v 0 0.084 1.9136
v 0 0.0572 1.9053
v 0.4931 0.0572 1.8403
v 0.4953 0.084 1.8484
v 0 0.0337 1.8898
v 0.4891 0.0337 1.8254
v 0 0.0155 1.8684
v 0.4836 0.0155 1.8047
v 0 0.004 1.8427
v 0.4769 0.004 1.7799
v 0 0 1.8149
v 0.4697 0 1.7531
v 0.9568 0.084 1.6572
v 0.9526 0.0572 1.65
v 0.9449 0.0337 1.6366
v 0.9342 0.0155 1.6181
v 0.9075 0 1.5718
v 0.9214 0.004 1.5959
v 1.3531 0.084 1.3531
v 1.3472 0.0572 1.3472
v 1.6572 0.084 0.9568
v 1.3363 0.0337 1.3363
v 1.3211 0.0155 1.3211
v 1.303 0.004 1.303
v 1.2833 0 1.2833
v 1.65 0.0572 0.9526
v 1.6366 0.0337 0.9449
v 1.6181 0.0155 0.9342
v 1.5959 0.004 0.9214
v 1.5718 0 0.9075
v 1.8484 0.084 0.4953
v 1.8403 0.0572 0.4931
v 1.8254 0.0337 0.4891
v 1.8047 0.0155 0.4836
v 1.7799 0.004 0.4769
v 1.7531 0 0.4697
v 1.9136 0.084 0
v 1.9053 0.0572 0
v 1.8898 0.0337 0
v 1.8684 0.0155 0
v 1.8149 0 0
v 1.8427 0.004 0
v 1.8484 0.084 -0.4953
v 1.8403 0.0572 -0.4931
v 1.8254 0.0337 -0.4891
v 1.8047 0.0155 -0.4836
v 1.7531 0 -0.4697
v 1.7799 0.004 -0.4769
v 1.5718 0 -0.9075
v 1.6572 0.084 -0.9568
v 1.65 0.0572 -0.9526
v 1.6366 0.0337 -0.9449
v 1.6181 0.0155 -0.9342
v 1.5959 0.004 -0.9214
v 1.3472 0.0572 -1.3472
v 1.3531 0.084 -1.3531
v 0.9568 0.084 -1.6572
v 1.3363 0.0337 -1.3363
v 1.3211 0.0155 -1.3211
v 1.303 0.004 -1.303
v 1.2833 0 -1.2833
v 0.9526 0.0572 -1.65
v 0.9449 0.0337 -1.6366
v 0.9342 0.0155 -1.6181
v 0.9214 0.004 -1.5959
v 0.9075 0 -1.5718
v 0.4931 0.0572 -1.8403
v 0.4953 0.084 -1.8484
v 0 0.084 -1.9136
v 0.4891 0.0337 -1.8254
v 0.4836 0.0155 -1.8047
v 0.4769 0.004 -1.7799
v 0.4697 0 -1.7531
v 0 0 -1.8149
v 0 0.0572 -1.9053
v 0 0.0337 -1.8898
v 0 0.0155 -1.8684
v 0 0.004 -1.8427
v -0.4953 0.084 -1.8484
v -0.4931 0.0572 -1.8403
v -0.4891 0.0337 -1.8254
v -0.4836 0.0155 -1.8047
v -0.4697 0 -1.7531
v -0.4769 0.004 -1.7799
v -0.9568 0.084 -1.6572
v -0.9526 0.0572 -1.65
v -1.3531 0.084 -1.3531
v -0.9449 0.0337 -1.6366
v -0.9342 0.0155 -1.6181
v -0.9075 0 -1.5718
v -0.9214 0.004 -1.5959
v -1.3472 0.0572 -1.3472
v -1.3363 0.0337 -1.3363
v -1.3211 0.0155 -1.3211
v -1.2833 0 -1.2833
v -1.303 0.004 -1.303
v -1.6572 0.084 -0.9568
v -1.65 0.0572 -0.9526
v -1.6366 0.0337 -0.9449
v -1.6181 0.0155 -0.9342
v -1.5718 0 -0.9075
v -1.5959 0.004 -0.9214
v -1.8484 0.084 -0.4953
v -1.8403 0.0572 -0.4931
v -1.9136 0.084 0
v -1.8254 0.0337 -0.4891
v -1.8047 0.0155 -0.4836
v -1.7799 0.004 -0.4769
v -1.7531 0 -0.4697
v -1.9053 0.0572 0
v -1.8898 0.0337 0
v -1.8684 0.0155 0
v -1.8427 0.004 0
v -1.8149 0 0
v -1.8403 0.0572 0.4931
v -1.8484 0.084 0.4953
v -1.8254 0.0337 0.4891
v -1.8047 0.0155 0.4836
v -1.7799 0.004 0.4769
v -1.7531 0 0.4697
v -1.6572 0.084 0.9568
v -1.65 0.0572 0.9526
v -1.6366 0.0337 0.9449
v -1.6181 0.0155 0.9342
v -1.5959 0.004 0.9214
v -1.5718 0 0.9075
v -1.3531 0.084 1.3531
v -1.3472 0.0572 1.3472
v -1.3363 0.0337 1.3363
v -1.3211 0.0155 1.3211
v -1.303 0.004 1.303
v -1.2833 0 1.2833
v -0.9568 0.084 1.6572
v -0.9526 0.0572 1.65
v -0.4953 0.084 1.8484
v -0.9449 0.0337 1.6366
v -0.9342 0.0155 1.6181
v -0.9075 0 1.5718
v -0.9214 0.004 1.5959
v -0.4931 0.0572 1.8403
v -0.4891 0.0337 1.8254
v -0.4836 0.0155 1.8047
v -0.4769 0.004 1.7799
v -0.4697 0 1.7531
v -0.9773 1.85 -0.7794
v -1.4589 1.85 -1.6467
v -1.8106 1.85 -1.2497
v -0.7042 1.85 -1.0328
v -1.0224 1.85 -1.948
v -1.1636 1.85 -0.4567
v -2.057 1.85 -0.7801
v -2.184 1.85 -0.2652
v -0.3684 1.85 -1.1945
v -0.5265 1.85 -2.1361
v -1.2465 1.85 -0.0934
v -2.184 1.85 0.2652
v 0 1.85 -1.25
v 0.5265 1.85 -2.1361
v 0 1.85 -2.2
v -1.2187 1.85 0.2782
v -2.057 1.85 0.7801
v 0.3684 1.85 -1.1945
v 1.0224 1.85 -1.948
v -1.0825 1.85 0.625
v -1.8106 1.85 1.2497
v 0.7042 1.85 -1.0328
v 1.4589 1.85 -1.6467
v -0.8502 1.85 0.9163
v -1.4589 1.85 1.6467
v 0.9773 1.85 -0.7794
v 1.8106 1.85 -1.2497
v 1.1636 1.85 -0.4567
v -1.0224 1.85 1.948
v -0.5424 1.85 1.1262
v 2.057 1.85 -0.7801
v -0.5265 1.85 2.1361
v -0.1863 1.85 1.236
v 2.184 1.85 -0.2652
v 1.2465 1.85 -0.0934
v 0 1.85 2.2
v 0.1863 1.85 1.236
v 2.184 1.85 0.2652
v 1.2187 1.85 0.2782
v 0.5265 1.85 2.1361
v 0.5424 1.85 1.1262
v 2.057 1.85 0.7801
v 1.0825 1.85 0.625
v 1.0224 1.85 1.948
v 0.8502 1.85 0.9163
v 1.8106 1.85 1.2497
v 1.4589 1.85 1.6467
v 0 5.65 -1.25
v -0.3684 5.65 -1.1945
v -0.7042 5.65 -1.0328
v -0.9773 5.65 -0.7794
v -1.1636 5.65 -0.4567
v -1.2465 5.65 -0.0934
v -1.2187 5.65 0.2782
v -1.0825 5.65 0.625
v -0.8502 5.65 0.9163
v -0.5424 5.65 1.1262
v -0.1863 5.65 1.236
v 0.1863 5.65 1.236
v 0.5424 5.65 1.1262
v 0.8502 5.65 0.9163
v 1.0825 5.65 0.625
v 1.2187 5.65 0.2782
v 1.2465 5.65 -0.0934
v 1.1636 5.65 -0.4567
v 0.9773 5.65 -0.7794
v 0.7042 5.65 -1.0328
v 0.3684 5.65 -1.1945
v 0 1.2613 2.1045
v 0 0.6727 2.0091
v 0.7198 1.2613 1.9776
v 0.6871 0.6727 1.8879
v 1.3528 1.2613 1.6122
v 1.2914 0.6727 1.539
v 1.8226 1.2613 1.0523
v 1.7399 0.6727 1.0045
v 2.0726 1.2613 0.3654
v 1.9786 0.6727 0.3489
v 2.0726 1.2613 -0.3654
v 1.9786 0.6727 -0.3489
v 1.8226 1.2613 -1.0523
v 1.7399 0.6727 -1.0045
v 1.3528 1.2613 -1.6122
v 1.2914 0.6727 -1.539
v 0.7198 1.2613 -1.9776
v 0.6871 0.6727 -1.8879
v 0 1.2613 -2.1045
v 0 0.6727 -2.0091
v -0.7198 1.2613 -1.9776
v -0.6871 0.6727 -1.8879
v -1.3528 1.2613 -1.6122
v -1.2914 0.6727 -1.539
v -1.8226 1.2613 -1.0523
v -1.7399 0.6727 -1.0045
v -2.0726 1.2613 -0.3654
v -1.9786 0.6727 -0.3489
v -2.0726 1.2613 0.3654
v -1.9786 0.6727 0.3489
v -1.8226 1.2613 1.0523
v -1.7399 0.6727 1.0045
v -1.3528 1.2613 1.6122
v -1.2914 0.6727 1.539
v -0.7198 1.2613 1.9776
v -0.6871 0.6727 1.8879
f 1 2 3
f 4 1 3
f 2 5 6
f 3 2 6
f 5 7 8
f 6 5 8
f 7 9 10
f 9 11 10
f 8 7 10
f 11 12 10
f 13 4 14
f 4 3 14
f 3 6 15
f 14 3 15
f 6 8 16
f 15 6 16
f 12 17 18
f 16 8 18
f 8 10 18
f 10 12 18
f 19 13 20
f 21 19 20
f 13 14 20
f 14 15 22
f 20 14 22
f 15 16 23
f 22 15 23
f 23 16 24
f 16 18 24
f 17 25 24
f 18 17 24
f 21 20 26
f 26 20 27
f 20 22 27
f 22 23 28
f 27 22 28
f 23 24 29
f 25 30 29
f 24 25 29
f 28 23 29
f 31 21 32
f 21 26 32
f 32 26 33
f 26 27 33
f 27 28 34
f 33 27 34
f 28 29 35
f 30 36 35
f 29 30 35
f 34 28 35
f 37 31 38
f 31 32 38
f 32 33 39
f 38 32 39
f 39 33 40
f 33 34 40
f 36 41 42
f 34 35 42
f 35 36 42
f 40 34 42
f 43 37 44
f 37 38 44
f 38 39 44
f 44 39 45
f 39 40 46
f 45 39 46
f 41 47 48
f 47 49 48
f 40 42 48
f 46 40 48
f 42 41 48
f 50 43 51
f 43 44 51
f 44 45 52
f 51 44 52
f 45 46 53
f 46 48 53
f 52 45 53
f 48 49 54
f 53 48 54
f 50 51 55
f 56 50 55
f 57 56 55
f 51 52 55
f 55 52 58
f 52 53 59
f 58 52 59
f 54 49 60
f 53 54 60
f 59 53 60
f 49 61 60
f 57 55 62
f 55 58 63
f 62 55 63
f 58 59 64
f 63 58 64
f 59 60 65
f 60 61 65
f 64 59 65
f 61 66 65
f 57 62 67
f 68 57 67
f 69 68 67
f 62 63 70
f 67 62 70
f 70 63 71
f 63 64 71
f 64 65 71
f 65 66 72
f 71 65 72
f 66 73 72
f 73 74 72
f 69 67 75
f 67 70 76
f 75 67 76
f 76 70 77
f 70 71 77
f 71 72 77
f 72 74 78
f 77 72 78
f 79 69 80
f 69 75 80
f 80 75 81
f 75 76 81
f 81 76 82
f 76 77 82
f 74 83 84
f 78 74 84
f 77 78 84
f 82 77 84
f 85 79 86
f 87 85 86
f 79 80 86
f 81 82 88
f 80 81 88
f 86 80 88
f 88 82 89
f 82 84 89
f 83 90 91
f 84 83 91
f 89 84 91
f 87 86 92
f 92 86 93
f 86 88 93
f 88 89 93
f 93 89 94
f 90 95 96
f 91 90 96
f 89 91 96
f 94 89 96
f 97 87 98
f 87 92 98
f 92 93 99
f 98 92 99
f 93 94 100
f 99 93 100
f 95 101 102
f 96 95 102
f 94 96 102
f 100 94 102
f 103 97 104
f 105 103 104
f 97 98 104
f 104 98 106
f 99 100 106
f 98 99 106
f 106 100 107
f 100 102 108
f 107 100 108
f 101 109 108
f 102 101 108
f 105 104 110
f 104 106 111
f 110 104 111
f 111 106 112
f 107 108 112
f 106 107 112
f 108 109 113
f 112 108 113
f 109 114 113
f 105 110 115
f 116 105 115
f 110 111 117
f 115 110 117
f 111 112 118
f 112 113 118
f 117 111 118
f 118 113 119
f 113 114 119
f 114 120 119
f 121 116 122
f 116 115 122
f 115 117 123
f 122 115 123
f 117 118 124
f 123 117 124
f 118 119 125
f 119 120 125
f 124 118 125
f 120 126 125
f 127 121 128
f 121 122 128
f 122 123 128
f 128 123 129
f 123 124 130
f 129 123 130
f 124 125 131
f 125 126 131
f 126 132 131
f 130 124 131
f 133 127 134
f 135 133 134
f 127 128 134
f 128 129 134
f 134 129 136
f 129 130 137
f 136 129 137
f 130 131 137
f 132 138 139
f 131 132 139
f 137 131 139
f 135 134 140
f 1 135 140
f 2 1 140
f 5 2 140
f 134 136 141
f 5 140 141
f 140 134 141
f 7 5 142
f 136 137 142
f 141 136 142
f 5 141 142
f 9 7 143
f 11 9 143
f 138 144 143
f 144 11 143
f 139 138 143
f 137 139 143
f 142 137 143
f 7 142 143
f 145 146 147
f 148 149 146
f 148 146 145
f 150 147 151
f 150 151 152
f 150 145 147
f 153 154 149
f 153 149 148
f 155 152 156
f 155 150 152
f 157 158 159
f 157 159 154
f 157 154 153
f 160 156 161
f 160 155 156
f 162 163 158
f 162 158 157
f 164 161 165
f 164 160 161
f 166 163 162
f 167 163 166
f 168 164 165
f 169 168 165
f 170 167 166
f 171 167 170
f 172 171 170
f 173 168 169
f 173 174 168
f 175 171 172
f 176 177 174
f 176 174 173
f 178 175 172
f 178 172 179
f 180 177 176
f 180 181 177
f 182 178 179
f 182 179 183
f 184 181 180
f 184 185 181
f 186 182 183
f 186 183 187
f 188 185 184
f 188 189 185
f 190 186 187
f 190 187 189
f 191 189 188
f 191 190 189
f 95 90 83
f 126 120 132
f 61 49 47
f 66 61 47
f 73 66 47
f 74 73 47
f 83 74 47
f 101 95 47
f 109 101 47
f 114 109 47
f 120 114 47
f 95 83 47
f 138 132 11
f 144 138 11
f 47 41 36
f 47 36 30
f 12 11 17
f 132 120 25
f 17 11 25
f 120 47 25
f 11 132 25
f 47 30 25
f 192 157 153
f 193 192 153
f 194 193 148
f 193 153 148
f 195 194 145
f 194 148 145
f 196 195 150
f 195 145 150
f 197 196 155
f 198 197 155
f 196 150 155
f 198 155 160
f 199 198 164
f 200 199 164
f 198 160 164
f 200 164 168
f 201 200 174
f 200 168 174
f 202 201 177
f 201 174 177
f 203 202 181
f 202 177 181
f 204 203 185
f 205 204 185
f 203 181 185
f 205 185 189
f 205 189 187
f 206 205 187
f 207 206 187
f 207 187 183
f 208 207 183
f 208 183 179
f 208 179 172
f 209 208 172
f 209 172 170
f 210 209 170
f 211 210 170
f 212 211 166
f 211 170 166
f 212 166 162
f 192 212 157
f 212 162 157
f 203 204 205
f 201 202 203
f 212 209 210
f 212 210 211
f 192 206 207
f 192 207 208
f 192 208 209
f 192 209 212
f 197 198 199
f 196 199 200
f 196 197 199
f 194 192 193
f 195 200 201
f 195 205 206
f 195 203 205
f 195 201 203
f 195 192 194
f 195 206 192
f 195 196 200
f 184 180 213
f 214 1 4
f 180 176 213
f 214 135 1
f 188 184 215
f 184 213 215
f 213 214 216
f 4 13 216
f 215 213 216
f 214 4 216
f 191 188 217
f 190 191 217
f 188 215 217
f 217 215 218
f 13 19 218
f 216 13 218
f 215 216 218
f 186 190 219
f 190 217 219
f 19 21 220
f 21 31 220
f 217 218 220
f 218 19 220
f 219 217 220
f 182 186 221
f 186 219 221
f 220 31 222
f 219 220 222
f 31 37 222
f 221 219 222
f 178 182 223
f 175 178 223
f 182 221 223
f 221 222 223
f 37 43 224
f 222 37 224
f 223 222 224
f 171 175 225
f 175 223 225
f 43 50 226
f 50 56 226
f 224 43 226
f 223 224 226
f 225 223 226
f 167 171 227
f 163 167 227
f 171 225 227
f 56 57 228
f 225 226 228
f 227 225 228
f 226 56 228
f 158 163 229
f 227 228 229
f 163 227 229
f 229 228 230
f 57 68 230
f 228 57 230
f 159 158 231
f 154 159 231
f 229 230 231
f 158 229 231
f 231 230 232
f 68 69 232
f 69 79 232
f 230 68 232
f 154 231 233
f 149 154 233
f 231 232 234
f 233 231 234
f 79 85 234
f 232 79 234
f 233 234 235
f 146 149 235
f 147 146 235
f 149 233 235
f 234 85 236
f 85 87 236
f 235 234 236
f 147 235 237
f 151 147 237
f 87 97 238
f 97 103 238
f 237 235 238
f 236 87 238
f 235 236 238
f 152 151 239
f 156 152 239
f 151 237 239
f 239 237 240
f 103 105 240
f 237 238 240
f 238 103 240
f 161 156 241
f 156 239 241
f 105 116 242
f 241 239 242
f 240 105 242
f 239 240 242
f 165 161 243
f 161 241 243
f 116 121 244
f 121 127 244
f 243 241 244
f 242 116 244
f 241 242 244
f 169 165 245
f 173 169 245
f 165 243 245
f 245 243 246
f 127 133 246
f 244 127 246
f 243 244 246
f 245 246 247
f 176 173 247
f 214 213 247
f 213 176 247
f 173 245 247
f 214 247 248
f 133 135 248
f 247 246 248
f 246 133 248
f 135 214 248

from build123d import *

# Parameters (mm, degrees)
ESQUISSE1_R        = 2.2
BOSS_EXTRU_1_DEPTH = 1.85
ESQUISSE2_R        = 1.25
BOSS_EXTRU_2_DEPTH = 3.8
CHANFREIN1_SIZE    = 1.85
CHANFREIN1_SIZE_2  = 0.3
CONG_1_R           = 0.1


with BuildPart() as part:
    # Esquisse1 → Boss.-Extru.1 (new body)
    with BuildSketch(Plane(origin=(0, 0, 0), x_dir=(1, 0, 0), z_dir=(0, 1, 0))):
        with Locations(Location((0, 0, 0), (0, 0, 270))):
            Circle(ESQUISSE1_R)
    extrude(amount=BOSS_EXTRU_1_DEPTH)

    # Esquisse2 → Boss.-Extru.2 (add)
    with BuildSketch(Plane(origin=(0, 1.85, 0), x_dir=(1, 0, 0), z_dir=(0, 1, 0))):
        with Locations(Location((0, 0, 0), (0, 0, 90))):
            Circle(ESQUISSE2_R)
    extrude(amount=BOSS_EXTRU_2_DEPTH)

    # Chanfrein1
    # the kernel refuses this chamfer: 1.85, 0.3 mm, written as the material it takes off along each edge
    with BuildSketch(Plane(origin=(0, 0, 0), x_dir=(0, 0, 1), z_dir=(-1, 0, 0))) as chanfrein1_piece_1:
        Polygon((2.2, CHANFREIN1_SIZE), (2.2 - CHANFREIN1_SIZE_2, 0), (2.2, 0), align=None)
    revolve(axis=Axis((0, 0, 0), (0, 1, 0)), mode=Mode.SUBTRACT)

    # Congé1
    cong_1_edges = [part.edges().sort_by_distance(p)[0] for p in [
        (0, 0, -1.9),
    ]]
    fillet(cong_1_edges, radius=CONG_1_R)


solid = part.part
